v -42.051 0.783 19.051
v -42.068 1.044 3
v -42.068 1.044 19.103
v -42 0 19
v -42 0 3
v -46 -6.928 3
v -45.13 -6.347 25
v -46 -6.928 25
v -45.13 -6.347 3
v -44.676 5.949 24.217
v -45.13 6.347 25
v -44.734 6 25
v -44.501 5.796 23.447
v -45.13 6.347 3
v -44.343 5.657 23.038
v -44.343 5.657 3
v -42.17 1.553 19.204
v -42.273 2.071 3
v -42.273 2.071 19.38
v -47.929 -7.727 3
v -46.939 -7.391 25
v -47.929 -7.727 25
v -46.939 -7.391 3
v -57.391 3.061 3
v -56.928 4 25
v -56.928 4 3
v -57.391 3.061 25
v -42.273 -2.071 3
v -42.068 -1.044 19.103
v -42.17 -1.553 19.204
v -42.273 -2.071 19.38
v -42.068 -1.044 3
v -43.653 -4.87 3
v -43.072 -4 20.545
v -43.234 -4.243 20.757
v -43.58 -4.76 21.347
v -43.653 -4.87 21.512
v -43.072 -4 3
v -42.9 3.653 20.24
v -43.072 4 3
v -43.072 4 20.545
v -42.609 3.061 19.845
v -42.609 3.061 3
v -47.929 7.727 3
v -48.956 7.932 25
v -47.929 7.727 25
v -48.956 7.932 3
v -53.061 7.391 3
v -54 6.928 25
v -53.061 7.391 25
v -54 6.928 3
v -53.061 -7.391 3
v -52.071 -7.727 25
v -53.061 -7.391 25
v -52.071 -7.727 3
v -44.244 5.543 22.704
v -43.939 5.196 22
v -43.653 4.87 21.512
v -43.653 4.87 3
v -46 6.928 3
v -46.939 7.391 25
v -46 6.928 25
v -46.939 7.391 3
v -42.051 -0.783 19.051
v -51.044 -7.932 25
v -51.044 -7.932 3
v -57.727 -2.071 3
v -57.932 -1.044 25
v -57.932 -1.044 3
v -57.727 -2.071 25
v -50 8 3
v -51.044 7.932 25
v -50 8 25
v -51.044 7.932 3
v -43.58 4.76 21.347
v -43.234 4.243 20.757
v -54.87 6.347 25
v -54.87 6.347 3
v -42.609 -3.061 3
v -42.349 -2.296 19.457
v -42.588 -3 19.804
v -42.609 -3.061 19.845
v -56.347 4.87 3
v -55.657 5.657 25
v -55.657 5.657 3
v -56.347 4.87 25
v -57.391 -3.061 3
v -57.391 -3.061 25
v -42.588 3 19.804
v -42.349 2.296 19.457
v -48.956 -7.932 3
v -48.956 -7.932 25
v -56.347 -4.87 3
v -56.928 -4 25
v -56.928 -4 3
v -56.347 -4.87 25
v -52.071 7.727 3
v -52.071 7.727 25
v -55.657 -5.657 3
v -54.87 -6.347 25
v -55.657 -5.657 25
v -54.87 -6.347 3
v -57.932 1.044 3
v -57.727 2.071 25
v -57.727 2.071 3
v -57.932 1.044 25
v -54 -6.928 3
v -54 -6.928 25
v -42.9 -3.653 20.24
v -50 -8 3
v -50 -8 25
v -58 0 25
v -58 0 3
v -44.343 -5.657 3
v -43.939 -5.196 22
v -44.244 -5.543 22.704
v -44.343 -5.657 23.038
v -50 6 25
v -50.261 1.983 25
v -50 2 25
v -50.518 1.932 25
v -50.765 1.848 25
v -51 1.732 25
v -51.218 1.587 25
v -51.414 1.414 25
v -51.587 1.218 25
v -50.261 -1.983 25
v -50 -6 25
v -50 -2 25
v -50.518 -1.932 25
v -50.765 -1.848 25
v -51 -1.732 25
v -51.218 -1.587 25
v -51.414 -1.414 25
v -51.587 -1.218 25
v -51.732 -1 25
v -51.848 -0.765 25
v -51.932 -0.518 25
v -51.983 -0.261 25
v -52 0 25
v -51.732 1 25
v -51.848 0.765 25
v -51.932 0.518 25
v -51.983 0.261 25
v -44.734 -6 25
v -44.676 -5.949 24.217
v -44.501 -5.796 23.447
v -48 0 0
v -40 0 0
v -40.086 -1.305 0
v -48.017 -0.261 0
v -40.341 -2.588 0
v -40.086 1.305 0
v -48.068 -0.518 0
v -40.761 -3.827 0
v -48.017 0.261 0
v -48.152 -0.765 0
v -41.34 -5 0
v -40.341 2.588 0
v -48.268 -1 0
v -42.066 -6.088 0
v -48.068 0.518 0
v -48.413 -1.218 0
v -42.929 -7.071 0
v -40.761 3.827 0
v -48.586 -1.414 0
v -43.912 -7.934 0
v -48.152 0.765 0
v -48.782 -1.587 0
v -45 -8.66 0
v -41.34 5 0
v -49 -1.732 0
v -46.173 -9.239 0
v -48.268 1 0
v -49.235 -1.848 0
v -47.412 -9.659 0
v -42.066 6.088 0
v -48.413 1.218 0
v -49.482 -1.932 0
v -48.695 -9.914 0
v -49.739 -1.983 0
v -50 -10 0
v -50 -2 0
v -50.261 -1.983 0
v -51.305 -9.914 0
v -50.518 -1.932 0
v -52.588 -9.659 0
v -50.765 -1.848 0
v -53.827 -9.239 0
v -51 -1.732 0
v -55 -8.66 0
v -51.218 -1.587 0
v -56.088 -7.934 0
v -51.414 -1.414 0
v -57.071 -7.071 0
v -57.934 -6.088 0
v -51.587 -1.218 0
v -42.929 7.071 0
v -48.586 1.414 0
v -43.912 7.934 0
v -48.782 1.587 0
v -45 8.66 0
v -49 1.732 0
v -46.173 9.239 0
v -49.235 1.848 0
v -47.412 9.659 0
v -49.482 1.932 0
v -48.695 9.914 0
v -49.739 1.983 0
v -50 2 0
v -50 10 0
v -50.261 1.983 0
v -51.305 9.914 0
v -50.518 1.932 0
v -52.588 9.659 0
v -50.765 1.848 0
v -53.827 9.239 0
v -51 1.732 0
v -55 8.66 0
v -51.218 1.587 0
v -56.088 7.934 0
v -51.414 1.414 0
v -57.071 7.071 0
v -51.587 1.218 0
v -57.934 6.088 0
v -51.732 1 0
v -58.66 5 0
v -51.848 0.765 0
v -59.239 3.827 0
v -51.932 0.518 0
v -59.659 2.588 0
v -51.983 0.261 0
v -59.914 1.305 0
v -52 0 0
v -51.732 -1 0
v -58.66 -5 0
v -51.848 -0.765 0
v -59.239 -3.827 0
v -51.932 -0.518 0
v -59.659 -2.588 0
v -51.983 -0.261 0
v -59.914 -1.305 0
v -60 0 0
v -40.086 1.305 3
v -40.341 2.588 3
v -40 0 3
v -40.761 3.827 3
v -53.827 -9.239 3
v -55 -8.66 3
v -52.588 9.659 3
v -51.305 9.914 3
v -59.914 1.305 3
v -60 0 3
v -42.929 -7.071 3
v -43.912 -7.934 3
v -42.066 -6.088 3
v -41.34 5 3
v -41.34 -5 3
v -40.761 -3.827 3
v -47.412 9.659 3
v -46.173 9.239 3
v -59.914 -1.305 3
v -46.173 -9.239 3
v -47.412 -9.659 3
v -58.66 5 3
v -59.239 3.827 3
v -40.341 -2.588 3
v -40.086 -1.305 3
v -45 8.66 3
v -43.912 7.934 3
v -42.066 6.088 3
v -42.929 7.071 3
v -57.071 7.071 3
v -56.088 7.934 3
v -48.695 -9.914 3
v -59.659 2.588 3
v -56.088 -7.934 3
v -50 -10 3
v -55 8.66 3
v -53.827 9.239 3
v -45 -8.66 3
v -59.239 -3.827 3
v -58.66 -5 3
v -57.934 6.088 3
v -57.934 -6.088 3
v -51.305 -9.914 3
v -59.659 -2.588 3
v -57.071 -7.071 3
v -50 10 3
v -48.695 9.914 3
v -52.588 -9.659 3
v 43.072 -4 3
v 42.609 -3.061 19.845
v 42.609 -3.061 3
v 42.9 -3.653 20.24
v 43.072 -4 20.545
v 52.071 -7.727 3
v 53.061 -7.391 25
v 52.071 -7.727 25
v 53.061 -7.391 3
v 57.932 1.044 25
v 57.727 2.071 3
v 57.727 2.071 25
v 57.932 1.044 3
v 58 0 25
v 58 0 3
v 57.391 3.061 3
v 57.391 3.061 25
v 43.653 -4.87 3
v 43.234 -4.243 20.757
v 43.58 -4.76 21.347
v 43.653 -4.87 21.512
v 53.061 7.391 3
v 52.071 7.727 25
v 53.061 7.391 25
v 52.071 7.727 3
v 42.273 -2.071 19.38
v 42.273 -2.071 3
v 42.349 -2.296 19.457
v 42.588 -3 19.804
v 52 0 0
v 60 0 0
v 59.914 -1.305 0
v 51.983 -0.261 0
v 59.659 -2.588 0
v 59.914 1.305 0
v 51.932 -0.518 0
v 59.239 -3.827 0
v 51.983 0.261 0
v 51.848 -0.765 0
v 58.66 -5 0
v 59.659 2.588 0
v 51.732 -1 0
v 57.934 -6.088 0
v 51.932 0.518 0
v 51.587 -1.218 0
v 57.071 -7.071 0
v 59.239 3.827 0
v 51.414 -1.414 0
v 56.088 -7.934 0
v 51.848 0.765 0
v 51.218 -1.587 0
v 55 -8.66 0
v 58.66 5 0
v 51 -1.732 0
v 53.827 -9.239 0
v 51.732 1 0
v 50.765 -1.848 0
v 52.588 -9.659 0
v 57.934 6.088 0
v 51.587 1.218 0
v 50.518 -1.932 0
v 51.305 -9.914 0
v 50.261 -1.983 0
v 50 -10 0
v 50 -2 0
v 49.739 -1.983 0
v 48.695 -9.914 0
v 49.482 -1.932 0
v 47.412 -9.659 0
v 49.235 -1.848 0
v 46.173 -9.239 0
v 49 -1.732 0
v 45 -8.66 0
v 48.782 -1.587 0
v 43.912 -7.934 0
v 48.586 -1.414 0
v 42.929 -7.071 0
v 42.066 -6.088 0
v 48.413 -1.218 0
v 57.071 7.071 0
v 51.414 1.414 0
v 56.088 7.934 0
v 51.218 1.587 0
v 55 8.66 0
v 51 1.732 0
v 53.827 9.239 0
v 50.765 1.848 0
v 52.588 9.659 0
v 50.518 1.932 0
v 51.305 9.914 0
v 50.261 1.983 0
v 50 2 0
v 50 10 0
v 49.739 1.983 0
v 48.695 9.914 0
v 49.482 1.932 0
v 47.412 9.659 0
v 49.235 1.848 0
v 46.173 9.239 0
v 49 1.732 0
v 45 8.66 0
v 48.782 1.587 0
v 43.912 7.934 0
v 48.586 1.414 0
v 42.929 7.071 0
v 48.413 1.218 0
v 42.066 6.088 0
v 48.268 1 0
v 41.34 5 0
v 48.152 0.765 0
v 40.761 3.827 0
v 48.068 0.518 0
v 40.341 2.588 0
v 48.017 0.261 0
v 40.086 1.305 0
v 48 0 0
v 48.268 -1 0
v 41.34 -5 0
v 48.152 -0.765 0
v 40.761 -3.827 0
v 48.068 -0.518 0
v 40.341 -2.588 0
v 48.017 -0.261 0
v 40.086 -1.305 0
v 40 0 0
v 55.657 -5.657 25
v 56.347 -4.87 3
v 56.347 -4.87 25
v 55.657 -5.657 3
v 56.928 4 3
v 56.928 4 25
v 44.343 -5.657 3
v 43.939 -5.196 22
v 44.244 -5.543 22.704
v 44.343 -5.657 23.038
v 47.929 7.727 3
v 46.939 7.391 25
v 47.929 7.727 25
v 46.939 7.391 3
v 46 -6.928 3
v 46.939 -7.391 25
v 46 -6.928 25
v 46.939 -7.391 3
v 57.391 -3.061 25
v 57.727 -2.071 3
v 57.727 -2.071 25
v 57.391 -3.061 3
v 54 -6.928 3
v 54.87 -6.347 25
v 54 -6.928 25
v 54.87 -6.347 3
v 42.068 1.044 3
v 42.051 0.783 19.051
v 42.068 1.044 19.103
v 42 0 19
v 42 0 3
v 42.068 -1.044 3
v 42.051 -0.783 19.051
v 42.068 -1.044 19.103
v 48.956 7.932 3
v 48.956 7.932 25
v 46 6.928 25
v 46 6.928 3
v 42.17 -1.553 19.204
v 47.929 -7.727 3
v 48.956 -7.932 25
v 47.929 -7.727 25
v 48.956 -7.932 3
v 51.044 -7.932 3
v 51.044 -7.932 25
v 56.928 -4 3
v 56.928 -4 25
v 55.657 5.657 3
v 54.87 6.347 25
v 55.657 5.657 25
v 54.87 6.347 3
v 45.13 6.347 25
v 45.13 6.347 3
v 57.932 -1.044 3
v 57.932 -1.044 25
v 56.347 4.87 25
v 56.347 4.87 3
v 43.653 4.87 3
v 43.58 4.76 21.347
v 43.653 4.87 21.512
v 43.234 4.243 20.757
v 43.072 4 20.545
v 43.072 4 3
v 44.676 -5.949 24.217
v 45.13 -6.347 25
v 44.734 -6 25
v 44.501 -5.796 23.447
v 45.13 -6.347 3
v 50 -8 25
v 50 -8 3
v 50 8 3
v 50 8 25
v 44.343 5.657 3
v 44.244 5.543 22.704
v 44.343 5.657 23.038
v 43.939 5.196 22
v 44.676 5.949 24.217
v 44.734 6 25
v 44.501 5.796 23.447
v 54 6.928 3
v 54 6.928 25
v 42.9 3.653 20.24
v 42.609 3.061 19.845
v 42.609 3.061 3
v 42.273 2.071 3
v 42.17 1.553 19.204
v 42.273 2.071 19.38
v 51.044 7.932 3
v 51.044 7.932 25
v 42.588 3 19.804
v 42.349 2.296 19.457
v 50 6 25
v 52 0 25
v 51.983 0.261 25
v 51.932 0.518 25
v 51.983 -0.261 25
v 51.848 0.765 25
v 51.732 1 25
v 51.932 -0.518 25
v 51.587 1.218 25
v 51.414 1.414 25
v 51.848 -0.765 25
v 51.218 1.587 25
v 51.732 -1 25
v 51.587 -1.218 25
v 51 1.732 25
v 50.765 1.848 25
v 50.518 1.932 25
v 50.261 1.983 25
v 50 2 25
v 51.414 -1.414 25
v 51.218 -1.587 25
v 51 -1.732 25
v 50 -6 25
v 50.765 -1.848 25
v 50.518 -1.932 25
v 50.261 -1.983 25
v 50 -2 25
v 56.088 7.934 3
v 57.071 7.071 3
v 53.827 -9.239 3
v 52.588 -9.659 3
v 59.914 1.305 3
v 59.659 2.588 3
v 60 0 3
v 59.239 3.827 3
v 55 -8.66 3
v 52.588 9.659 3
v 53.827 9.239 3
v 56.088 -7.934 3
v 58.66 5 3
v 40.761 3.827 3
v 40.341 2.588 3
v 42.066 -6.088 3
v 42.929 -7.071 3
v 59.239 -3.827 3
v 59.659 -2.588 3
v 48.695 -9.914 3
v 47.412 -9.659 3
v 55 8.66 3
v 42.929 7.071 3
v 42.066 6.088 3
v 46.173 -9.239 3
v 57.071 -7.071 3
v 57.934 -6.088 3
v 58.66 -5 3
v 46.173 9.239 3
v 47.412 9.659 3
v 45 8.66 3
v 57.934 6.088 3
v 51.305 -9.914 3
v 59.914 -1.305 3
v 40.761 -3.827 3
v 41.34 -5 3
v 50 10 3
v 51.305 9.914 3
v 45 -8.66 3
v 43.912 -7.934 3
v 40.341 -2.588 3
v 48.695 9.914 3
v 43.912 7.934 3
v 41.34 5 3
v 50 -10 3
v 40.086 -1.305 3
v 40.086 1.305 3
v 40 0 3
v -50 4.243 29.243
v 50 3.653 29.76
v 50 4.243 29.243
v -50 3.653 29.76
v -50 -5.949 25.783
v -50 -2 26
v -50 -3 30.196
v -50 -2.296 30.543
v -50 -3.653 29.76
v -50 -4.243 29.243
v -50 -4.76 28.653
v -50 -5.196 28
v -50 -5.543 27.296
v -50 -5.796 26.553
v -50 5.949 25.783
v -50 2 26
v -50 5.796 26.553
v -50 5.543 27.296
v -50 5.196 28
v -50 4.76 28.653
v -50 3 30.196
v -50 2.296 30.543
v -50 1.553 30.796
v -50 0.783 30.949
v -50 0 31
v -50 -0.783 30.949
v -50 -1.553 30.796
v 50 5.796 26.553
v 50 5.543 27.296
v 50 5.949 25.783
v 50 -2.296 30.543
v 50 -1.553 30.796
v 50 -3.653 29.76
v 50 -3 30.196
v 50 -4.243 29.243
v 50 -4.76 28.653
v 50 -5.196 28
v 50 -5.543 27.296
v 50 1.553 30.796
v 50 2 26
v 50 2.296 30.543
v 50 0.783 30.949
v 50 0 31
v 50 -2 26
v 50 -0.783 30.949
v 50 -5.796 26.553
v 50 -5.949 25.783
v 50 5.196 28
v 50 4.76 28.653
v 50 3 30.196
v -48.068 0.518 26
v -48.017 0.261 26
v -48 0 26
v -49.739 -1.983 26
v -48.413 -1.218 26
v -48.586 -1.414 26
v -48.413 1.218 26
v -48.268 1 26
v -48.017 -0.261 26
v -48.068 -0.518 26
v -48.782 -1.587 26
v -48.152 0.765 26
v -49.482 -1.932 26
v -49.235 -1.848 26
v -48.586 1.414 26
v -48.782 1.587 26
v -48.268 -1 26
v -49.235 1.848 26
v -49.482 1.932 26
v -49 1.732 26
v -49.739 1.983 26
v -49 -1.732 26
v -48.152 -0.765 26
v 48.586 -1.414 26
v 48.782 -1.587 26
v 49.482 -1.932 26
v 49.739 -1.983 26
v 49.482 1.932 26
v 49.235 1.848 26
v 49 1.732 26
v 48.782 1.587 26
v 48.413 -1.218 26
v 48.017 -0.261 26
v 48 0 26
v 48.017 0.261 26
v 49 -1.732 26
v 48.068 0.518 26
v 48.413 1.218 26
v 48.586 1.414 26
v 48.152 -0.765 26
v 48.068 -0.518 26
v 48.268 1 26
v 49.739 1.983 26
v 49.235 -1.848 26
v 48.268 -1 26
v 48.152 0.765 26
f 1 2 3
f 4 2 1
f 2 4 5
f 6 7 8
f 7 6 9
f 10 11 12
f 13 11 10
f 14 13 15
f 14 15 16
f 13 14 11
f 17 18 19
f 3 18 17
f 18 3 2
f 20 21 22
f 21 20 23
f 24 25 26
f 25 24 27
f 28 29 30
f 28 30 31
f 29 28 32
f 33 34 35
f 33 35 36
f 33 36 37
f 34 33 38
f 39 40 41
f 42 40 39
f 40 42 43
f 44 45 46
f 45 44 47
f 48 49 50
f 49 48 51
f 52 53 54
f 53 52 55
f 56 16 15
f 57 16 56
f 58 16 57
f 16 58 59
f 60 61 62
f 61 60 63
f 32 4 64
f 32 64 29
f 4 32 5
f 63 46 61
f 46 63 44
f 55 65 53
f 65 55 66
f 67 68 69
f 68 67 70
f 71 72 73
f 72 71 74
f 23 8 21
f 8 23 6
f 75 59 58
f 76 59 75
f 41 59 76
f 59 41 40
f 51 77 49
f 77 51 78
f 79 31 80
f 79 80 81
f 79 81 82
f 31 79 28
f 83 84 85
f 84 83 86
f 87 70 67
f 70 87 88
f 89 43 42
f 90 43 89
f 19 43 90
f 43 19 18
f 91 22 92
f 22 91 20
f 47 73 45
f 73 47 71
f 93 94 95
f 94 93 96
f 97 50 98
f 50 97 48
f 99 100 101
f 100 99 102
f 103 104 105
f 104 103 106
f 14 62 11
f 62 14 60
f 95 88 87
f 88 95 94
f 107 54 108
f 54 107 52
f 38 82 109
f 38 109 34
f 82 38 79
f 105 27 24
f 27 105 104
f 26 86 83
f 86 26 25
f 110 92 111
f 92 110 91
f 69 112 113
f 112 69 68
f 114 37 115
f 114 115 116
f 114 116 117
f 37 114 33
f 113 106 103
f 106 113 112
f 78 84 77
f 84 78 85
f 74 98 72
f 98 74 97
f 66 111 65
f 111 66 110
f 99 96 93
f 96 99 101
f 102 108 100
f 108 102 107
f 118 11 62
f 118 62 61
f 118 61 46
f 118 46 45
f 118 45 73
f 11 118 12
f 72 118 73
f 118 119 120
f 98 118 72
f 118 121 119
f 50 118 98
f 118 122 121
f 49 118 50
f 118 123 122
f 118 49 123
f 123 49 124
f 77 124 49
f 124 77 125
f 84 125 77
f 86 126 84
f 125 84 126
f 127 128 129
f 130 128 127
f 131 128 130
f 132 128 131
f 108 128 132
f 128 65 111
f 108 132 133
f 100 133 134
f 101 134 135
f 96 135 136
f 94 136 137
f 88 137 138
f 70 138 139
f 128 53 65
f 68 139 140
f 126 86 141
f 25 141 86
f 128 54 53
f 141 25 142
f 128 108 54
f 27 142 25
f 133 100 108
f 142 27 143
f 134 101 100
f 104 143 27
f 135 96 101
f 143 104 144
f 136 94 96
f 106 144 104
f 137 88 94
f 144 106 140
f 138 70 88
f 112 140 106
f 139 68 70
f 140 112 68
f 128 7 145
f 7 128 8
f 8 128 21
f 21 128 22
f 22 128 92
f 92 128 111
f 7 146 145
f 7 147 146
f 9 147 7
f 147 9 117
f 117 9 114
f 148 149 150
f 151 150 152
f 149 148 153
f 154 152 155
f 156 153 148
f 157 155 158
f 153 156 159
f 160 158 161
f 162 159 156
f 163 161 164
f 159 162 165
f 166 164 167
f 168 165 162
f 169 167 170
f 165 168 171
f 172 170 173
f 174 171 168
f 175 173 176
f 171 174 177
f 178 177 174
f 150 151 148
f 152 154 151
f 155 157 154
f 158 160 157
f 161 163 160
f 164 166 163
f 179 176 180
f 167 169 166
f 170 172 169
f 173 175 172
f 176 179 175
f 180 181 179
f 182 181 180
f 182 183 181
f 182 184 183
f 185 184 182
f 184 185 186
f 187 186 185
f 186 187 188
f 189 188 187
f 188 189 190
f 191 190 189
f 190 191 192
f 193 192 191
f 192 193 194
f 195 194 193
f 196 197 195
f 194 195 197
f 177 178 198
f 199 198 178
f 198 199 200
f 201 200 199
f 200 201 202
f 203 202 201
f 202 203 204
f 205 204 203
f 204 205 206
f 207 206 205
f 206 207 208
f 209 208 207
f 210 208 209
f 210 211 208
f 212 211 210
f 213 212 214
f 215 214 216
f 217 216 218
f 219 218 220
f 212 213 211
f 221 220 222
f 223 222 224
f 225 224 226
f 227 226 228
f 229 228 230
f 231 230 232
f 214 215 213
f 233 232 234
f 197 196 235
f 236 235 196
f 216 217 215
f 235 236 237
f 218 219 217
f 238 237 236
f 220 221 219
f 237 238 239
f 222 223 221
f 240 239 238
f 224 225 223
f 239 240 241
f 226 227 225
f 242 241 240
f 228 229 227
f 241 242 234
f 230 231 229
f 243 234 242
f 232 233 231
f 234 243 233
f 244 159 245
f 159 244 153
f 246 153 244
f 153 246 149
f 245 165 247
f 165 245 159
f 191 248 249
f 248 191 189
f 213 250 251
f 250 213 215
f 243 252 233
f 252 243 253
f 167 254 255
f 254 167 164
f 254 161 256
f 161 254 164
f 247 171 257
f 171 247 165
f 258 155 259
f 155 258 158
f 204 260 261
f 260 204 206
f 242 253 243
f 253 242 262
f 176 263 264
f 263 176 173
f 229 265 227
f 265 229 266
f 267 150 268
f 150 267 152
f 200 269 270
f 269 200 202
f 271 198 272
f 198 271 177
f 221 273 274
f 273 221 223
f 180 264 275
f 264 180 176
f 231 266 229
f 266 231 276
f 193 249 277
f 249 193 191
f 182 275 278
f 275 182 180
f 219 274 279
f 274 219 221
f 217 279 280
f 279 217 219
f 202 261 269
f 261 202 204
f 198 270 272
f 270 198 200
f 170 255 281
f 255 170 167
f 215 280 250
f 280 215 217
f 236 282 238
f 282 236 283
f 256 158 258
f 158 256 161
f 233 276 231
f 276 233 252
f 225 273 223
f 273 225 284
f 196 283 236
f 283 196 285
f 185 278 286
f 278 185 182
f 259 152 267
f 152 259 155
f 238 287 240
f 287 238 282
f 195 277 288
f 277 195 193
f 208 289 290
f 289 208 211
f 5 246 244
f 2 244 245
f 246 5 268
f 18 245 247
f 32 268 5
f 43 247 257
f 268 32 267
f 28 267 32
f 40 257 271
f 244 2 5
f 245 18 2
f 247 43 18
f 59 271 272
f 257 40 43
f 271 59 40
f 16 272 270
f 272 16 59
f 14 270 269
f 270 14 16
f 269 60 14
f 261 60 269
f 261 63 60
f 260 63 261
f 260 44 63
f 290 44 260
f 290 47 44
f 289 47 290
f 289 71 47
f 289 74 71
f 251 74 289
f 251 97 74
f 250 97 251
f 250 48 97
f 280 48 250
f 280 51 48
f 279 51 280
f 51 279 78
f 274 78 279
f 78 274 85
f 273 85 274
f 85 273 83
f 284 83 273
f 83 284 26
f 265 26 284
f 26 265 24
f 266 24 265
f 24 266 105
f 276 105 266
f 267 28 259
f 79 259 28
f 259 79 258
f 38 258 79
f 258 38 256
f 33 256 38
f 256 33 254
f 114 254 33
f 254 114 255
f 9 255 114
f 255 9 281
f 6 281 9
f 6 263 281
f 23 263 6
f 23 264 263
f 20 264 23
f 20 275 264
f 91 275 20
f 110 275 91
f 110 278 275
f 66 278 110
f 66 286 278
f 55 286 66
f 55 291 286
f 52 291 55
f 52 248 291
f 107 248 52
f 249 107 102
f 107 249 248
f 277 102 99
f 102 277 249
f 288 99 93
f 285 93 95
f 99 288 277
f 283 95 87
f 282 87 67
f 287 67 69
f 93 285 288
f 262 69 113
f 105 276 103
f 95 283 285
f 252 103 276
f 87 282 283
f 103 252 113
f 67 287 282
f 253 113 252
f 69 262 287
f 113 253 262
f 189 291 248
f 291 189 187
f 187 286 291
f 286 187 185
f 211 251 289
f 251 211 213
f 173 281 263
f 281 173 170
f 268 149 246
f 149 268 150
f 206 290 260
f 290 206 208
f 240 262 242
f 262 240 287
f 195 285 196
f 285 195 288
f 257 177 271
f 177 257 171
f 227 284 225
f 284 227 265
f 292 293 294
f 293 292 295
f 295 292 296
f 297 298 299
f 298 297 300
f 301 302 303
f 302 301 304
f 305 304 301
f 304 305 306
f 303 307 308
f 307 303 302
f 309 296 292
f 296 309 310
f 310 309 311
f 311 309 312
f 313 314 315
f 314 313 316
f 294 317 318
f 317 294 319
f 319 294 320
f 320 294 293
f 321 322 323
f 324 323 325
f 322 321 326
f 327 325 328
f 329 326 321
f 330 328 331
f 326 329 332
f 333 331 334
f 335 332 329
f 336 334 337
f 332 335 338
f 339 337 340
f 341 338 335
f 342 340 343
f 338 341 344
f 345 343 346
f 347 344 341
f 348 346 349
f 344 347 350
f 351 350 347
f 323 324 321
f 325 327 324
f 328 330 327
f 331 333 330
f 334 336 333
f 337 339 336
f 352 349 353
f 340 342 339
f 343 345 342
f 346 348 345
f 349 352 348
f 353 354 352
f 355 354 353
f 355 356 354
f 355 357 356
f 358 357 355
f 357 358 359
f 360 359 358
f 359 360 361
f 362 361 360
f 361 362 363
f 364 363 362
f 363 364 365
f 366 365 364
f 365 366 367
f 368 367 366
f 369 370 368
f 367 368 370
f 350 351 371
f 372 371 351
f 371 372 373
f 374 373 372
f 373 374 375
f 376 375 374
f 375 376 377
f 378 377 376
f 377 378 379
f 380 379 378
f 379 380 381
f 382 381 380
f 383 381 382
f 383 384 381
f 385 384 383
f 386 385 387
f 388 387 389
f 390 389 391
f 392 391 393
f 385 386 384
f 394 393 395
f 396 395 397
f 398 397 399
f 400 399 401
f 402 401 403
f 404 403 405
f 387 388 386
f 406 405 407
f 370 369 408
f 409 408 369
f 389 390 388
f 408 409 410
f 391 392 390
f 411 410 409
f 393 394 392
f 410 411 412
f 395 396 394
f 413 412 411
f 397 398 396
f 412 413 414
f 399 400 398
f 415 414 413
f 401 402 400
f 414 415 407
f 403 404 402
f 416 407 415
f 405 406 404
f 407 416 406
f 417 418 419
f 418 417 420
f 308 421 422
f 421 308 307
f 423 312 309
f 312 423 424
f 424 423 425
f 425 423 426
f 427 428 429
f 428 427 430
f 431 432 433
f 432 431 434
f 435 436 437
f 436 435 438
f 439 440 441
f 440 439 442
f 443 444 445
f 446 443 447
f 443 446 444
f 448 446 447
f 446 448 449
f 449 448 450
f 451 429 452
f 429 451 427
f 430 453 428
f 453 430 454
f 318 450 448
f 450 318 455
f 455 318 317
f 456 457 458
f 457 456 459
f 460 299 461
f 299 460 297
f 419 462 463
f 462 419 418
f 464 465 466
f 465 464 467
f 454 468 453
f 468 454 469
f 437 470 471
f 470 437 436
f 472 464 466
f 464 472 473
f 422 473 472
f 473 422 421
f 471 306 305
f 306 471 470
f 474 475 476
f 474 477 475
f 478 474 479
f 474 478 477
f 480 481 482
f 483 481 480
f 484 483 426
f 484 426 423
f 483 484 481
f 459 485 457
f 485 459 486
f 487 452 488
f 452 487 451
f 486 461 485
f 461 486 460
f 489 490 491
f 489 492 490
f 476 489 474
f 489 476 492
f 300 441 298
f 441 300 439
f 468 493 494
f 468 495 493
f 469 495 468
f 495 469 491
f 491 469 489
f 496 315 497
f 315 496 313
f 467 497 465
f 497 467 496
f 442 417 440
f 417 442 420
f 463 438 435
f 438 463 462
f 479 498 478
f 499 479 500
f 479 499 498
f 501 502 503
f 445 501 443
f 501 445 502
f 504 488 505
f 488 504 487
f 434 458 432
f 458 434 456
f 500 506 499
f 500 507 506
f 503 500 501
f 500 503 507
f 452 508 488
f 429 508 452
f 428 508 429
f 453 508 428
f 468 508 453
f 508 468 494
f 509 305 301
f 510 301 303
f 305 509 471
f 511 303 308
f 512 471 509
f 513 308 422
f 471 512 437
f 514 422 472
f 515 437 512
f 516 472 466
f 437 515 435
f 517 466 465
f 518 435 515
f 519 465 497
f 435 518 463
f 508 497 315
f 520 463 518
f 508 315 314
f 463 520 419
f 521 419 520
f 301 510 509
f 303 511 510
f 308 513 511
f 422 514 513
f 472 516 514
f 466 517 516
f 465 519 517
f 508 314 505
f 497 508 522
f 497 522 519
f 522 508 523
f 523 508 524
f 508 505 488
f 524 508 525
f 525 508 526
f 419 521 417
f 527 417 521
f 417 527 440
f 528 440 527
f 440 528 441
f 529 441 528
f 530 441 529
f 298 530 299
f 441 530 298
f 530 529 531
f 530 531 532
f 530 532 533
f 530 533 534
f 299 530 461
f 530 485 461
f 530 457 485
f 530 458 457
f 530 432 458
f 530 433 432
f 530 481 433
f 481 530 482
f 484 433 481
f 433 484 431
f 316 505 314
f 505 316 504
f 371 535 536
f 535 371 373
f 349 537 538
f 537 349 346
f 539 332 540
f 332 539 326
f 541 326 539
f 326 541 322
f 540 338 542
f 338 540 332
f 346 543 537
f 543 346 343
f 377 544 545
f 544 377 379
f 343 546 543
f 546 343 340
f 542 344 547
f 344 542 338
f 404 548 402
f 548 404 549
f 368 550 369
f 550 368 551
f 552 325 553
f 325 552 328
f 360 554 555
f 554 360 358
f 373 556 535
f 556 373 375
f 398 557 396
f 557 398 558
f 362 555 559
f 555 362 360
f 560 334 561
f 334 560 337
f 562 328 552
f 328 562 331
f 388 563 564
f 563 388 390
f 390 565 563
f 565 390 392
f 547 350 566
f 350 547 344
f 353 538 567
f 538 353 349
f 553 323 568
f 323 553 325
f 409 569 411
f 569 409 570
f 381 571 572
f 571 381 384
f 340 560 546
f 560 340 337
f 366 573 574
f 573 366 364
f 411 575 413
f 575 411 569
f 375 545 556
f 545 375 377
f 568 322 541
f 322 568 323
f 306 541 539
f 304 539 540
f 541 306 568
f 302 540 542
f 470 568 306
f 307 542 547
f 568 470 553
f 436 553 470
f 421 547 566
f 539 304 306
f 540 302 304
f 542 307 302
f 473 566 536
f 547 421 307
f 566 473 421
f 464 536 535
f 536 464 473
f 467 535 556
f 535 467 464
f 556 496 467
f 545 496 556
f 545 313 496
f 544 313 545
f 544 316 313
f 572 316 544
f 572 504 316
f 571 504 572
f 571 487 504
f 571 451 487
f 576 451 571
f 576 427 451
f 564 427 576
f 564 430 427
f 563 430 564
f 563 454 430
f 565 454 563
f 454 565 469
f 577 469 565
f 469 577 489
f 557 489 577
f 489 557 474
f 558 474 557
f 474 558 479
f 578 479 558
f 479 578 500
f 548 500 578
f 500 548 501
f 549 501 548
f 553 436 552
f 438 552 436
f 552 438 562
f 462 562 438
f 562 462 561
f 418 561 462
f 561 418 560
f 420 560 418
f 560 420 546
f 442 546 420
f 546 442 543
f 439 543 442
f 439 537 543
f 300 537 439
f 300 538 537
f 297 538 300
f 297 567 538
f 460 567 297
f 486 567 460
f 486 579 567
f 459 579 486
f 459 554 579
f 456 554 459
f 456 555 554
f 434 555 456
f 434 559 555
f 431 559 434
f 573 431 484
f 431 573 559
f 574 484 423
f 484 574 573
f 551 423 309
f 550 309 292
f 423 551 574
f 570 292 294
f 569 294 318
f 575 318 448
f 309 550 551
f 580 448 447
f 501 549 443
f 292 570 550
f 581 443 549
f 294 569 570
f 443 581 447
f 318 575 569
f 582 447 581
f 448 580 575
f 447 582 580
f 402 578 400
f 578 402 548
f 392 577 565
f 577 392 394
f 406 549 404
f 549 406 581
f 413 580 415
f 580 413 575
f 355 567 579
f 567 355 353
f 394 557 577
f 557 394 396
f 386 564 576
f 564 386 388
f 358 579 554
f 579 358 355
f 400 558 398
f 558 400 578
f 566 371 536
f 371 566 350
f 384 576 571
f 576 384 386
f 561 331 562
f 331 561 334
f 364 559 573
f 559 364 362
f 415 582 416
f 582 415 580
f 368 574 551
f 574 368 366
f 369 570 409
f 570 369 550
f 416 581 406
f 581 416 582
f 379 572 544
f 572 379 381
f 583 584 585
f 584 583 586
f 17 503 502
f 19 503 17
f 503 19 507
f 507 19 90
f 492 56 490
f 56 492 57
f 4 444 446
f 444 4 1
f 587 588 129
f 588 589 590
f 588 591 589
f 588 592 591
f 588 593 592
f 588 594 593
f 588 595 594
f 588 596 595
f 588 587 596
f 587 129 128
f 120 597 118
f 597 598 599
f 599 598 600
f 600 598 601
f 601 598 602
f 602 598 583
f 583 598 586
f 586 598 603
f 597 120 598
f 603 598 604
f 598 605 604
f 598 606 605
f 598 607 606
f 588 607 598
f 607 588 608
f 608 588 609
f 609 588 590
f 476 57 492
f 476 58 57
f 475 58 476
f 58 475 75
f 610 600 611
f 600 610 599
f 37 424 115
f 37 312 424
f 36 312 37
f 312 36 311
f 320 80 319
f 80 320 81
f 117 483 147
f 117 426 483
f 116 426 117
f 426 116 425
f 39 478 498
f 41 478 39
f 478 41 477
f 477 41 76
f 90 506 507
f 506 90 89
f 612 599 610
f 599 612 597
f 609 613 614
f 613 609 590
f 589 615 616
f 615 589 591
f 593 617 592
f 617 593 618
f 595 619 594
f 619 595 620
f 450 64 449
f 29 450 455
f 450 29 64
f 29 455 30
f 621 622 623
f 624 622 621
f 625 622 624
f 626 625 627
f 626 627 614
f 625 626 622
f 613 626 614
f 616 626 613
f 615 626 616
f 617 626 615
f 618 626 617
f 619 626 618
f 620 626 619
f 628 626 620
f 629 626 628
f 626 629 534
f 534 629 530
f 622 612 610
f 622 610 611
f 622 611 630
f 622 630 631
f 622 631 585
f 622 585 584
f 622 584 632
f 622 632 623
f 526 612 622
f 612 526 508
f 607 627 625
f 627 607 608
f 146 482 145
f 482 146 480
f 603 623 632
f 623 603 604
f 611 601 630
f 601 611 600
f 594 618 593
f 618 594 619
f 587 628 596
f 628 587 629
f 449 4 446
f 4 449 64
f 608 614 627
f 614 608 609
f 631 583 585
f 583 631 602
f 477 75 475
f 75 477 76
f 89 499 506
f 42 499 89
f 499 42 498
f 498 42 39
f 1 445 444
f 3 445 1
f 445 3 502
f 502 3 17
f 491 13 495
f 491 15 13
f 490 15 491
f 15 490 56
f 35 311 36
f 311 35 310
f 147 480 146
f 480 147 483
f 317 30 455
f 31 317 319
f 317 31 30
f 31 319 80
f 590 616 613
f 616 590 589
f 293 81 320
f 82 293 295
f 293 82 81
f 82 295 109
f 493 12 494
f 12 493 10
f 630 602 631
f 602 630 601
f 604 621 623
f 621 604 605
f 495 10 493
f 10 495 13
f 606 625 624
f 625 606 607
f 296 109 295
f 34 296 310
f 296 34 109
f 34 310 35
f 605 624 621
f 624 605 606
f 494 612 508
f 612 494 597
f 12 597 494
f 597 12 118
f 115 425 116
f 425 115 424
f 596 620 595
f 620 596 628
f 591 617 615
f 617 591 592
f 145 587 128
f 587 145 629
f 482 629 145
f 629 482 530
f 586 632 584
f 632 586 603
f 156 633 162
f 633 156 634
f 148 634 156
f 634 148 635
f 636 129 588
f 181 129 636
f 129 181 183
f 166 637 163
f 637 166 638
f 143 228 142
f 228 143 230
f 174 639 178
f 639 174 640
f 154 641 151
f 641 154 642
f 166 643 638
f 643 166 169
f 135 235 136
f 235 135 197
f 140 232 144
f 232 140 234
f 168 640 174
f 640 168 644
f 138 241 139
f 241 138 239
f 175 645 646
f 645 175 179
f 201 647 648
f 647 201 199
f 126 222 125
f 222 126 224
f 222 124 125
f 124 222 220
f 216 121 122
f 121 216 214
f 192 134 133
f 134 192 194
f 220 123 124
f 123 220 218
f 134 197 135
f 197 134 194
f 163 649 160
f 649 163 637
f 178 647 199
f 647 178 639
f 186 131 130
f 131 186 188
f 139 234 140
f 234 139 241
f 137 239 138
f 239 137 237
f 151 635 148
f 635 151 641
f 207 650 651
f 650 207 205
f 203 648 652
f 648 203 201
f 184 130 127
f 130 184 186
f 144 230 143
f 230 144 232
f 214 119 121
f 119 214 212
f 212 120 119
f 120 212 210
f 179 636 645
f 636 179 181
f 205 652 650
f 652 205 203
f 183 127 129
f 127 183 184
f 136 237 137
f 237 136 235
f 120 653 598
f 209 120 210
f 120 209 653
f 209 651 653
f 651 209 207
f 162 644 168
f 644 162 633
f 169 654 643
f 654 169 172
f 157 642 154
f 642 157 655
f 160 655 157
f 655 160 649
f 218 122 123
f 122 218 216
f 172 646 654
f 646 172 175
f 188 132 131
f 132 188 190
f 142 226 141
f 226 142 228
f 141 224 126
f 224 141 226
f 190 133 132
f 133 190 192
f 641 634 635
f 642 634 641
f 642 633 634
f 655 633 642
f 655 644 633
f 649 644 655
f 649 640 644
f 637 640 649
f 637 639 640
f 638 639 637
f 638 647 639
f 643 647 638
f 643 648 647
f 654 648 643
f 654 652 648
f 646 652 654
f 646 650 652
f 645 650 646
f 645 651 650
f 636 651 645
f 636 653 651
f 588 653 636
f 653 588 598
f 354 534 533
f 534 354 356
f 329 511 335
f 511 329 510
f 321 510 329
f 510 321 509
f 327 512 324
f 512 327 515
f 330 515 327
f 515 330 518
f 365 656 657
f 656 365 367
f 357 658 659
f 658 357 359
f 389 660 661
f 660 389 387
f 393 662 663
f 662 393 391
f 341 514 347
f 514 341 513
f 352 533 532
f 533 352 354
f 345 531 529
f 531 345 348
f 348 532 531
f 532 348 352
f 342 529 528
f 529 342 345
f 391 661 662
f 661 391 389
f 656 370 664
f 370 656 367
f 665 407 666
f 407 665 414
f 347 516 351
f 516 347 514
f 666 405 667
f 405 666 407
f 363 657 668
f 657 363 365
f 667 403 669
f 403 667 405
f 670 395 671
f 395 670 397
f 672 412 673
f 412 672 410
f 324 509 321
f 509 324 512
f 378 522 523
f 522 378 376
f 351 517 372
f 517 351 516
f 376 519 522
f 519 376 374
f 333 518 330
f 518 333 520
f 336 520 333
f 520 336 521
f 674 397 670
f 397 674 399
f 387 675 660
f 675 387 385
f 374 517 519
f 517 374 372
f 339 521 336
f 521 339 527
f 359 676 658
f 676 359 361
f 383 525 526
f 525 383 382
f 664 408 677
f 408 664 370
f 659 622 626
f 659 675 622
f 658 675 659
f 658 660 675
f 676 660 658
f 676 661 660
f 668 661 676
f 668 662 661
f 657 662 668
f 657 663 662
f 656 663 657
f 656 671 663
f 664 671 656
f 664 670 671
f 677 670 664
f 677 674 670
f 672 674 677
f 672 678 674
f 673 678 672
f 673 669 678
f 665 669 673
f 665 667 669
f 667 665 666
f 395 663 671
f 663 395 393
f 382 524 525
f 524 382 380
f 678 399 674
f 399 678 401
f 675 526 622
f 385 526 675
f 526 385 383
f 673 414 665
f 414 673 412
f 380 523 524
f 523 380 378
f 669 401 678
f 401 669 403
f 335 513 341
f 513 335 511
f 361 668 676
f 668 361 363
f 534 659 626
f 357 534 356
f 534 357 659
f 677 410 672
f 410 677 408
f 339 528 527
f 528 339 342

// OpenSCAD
// Drawer pull - a round grip bar standing off a surface on two legs with screw holes.
// NOVEL general hardware part.
//
// @desc drawer pull - a grip bar on two legs with screw holes
// @prompt Design a drawer pull handle in OpenSCAD: a round grip bar spanning {length} mm between two legs, {bar_d} mm thick, standing {standoff} mm off the surface, with a {screw} mm screw hole up through each leg. Reply with a single complete OpenSCAD file.
// @param length   span between legs, mm    [40:200]
// @param bar_d    grip bar diameter, mm     [8:20]
// @param standoff standoff height, mm       [15:40]
// @param screw    screw hole diameter, mm   [3:6]

length   = 100;
bar_d    = 12;
standoff = 25;
screw    = 4;

$fn = 48;

leg_d = bar_d + 4;

difference() {
    union() {
        for (x = [-length / 2, length / 2]) {
            translate([x, 0, 0]) cylinder(h = standoff, d = leg_d);      // legs
            translate([x, 0, 0]) cylinder(h = 3, d = leg_d + 4);         // foot pads
        }
        translate([-length / 2, 0, standoff]) rotate([0, 90, 0]) cylinder(h = length, d = bar_d);  // grip bar
    }
    for (x = [-length / 2, length / 2])
        translate([x, 0, -1]) cylinder(h = standoff + 2, d = screw);     // screw holes
}
